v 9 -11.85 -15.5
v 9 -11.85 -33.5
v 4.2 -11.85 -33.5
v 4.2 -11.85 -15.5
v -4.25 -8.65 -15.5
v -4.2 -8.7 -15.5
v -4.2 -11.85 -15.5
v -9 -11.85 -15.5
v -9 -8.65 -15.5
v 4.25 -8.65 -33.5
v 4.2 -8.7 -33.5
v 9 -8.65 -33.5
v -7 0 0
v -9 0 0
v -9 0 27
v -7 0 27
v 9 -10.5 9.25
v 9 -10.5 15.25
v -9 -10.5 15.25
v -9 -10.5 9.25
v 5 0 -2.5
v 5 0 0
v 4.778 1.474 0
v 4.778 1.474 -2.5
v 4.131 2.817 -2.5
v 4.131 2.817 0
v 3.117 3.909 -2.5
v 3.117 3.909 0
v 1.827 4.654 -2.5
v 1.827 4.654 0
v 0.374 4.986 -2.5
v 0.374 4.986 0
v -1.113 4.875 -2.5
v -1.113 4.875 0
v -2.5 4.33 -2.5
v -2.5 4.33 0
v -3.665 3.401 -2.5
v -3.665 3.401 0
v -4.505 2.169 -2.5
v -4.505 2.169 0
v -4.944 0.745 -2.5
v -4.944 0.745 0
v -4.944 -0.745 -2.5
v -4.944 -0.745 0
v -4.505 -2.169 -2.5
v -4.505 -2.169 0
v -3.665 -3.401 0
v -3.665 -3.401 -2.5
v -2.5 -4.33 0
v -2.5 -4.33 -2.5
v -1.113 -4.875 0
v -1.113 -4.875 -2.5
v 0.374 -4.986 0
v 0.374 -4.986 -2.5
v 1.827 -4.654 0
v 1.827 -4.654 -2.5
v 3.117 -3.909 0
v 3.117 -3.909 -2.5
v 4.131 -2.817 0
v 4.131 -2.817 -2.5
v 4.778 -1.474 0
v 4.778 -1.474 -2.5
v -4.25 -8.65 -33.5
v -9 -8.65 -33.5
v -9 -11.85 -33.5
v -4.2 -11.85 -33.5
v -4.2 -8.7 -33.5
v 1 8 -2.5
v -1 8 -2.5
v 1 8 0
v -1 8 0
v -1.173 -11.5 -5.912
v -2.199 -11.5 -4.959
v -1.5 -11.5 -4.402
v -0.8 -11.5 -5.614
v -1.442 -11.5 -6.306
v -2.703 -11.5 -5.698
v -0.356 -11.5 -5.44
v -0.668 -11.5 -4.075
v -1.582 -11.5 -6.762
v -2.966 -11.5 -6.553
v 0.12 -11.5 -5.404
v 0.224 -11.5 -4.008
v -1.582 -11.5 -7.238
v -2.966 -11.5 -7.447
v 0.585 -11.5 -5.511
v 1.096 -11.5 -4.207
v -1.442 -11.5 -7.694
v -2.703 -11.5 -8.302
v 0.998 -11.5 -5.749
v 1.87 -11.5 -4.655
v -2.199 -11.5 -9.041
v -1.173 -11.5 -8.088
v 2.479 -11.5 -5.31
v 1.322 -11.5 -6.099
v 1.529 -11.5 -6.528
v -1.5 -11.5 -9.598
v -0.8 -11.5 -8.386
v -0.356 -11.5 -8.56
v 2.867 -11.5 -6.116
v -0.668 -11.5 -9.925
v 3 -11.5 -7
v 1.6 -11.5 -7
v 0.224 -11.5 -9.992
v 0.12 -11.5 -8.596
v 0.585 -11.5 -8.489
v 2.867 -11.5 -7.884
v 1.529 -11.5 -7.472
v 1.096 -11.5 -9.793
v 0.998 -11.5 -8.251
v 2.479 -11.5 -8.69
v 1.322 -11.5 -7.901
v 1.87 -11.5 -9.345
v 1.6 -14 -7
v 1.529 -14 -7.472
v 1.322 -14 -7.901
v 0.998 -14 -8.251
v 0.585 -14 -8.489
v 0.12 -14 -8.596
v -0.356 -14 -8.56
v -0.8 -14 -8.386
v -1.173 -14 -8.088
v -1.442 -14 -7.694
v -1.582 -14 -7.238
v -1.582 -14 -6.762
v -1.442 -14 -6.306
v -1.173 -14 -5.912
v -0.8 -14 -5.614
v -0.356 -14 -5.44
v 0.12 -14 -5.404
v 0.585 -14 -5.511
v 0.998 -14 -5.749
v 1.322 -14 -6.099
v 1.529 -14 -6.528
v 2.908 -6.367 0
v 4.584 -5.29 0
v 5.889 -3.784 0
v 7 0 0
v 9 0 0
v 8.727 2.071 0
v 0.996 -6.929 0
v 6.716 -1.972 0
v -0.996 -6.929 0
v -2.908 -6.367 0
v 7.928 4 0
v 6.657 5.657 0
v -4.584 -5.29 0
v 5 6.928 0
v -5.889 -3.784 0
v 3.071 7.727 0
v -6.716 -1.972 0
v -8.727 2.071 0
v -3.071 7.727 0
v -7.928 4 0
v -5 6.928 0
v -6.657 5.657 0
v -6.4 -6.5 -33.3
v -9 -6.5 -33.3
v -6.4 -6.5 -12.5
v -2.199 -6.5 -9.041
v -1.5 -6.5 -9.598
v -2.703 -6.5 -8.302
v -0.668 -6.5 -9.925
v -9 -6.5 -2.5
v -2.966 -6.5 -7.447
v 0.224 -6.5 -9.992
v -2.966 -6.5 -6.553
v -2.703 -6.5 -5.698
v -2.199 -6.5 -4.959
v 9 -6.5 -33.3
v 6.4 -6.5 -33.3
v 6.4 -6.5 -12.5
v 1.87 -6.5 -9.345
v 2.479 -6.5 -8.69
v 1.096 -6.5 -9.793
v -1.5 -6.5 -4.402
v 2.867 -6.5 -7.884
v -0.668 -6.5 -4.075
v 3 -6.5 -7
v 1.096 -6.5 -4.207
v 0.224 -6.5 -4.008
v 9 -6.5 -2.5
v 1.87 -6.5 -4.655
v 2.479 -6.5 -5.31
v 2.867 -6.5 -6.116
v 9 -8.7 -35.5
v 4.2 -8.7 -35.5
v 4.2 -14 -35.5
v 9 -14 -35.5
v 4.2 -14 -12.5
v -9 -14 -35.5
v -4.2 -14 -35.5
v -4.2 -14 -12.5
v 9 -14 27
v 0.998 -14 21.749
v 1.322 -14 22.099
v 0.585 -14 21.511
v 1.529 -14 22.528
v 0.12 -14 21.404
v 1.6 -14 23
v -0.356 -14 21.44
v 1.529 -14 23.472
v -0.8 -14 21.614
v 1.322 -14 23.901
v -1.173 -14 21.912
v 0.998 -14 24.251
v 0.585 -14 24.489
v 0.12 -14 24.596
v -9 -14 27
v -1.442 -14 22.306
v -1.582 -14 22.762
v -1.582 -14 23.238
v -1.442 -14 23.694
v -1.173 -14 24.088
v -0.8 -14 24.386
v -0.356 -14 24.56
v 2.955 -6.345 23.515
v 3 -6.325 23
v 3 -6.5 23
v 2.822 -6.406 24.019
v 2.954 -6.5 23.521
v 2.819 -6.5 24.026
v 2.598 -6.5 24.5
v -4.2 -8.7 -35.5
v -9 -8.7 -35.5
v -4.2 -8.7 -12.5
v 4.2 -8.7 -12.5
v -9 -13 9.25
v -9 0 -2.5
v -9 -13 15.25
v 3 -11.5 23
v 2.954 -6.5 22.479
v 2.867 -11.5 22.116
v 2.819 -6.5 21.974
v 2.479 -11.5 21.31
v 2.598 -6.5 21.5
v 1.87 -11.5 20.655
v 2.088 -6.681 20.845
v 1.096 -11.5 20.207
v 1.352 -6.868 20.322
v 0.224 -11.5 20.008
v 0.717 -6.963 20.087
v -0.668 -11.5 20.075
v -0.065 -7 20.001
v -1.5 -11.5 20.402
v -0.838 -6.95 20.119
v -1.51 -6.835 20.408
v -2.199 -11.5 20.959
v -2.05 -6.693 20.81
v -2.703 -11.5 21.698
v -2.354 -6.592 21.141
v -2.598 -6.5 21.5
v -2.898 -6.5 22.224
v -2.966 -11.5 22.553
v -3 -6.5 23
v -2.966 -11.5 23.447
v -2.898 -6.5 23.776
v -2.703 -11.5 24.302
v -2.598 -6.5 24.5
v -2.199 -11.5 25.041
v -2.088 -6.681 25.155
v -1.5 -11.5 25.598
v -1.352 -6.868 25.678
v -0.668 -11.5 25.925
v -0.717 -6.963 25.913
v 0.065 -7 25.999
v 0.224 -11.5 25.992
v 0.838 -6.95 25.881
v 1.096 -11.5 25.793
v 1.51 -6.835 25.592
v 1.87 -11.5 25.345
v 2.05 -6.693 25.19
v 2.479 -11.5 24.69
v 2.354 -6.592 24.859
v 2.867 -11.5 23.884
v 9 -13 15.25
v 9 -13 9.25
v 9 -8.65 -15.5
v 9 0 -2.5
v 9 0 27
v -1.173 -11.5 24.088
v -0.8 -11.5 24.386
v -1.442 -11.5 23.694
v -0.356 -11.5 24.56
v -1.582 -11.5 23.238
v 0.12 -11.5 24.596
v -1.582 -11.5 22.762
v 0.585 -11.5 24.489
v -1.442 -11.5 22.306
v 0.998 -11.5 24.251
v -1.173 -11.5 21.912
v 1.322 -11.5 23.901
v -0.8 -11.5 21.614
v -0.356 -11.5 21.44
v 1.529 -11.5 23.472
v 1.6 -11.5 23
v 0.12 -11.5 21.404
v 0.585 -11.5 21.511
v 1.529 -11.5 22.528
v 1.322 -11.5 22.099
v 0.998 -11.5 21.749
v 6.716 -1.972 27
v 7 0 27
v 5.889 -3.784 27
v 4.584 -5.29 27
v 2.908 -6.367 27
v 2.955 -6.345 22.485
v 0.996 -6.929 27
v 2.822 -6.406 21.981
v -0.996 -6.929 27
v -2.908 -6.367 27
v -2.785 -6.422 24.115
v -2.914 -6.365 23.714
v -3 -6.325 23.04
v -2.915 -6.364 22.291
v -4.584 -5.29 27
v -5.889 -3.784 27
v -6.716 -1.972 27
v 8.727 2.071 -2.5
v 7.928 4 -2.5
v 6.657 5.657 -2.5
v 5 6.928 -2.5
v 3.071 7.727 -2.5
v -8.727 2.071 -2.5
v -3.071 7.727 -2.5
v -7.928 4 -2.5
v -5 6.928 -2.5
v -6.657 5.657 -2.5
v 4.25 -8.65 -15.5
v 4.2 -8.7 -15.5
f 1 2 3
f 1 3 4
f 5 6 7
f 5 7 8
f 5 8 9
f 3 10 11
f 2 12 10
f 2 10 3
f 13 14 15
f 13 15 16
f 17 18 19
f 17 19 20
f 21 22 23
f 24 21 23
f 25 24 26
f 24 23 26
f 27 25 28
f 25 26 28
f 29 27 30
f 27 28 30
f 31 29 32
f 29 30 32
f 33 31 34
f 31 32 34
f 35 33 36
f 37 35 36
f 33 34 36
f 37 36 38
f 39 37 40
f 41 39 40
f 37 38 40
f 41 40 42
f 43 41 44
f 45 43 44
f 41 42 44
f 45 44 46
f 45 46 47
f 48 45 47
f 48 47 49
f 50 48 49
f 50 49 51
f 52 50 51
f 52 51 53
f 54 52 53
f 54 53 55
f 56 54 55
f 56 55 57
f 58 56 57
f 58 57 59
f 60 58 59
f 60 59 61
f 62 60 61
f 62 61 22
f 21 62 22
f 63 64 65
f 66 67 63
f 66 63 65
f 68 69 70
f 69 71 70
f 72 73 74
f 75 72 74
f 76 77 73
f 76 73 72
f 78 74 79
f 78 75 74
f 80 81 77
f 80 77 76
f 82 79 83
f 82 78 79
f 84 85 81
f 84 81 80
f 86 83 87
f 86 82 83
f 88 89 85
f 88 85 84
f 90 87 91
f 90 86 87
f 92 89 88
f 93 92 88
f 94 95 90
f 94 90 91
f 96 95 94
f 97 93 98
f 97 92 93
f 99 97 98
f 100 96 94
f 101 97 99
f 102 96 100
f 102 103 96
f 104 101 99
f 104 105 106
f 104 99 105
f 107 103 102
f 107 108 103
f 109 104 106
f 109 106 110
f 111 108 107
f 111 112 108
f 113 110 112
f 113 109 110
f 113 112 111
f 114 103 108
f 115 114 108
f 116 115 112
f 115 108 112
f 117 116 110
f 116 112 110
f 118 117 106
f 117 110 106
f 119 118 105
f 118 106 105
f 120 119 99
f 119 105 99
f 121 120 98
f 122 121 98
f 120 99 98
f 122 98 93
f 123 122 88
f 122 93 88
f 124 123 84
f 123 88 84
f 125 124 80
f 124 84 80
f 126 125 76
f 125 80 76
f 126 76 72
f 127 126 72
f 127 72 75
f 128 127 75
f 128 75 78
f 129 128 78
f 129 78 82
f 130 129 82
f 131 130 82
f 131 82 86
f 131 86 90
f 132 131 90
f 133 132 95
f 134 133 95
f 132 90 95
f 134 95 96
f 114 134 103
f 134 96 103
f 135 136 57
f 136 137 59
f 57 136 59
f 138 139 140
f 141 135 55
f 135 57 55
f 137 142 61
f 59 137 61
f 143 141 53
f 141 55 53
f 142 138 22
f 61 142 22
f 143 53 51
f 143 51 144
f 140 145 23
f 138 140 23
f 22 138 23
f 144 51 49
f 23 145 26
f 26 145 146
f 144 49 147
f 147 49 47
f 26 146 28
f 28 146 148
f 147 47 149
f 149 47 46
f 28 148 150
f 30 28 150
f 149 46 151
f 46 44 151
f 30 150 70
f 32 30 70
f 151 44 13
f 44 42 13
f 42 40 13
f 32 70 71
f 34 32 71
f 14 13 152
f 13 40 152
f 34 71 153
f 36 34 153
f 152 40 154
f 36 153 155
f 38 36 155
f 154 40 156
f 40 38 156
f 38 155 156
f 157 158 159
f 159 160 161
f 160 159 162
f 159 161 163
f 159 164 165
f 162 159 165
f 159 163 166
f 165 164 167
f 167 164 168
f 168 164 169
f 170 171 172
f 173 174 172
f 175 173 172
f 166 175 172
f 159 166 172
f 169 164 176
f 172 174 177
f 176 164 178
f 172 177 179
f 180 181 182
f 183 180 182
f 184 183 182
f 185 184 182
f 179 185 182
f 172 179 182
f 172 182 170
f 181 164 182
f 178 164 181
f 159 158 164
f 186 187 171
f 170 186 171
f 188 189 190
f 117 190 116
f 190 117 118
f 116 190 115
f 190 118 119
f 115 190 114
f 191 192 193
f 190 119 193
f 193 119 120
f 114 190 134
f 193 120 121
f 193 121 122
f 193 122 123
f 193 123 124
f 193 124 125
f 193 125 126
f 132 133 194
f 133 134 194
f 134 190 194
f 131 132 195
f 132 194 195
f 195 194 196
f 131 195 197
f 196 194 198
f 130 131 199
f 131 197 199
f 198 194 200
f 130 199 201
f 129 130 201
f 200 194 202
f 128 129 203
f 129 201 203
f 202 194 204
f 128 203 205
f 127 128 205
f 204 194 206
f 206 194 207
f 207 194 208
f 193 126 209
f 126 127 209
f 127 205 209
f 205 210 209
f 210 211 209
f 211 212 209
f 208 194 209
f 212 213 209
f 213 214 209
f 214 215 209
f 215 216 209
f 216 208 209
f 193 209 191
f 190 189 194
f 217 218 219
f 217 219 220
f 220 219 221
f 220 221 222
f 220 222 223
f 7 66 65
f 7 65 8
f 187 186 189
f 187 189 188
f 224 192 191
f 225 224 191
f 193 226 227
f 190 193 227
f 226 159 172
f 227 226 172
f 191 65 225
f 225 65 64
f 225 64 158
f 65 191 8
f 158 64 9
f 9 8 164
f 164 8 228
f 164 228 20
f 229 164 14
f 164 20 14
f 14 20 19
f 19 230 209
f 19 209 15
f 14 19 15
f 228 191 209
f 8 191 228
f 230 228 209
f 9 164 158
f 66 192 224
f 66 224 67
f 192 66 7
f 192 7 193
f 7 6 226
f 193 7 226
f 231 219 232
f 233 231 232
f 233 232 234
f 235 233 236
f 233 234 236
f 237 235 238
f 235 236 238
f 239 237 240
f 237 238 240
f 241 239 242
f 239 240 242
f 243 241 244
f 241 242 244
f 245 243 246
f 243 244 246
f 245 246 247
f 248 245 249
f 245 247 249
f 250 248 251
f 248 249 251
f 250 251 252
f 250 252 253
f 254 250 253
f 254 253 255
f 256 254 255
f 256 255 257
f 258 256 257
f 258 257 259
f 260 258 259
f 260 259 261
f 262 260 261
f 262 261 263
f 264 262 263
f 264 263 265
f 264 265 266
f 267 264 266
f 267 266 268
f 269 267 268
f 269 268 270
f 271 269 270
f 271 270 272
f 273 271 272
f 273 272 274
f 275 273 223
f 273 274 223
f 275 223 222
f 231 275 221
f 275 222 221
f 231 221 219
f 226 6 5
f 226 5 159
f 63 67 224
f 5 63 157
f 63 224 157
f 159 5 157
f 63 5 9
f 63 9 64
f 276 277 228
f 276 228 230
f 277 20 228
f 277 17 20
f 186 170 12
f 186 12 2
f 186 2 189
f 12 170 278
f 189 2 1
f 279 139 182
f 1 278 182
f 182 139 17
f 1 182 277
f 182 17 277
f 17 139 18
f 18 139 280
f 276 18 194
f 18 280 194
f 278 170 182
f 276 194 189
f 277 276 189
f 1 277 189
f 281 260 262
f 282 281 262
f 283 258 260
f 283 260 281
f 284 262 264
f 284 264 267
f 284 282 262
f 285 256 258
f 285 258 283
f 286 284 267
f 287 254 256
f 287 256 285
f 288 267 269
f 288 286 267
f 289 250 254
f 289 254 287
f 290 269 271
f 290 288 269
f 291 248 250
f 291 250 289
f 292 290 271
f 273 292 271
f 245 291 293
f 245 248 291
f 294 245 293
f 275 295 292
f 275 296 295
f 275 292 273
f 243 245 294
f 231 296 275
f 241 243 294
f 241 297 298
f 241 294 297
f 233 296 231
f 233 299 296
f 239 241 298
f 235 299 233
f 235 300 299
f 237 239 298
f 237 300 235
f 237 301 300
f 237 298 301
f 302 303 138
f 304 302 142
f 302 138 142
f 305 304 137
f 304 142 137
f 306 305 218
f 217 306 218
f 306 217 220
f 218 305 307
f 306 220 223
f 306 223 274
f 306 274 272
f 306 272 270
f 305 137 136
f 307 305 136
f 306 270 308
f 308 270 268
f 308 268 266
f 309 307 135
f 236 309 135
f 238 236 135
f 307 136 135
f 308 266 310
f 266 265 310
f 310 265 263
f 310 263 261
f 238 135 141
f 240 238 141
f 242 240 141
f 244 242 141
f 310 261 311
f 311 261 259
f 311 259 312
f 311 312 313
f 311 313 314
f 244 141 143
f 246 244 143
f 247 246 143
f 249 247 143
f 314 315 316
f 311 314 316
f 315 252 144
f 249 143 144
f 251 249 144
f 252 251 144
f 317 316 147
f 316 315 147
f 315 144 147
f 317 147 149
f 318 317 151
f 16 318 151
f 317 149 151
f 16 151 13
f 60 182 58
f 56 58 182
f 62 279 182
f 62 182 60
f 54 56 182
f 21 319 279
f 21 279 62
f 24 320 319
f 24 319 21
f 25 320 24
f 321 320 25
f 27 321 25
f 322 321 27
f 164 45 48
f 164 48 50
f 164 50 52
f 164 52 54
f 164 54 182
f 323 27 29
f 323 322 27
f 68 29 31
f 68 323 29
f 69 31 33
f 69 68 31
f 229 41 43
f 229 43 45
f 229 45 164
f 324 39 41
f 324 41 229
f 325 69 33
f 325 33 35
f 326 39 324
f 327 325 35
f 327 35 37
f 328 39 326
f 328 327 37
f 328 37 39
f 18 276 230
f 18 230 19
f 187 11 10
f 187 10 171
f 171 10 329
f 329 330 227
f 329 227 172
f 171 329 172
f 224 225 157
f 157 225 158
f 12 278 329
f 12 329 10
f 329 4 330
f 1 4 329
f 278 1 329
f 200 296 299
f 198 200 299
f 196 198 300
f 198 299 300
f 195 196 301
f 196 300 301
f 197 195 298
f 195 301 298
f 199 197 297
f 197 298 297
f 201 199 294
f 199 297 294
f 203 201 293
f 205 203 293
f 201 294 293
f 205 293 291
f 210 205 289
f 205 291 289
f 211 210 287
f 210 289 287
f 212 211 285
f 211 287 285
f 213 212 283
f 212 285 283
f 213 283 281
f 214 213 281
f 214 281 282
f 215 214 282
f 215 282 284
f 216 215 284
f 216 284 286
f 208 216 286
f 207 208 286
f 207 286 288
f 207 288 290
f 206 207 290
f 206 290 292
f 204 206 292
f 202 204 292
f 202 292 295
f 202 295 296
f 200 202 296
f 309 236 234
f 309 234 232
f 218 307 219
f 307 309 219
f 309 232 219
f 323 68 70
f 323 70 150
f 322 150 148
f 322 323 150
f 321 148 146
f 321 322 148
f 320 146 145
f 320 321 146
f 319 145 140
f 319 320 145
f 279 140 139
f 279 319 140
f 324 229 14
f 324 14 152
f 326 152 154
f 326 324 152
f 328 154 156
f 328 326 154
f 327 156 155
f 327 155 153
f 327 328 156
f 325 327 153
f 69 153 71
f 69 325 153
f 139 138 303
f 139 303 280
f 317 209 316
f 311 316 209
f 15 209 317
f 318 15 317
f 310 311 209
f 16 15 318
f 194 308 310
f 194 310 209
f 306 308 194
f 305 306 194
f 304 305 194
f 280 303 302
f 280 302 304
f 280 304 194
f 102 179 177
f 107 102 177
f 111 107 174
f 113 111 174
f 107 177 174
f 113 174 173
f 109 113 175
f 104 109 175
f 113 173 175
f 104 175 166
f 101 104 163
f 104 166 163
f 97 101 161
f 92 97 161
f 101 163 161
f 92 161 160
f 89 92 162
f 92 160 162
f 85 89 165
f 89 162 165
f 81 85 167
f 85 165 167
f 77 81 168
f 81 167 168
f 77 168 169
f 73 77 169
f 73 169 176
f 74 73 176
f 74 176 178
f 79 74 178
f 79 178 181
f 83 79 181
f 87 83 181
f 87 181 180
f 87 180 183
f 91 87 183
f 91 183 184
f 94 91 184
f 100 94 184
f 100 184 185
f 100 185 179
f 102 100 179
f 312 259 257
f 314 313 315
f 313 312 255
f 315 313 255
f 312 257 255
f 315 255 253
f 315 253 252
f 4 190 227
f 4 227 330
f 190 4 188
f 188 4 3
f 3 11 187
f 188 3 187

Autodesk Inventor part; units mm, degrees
ref_plane "YZ Plane" through (0, 0, 0) normal (1, 0, 0) x (0, 1, 0)
ref_plane "XZ Plane" through (0, 0, 0) normal (0, 1, 0) x (-1, 0, 0)
ref_plane "XY Plane" through (0, 0, 0) normal (0, 0, 1) x (1, 0, 0)
sketch "Sketch1" plane through (0, 0, 0) normal (0, 0, 1) x (1, 0, 0)
  circle A0 centre (0, 0) radius 7
  circle A1 centre (0, 0) radius 5
  circle A2 centre (0, 0) radius 1
  line L0 (-9, 0) -> (9, 0)
  line L1 (9, 0) -> (9, -14)
  line L2 (9, -14) -> (-9, -14)
  line L3 (-9, -14) -> (-9, 0)
  dimension "d11" = 14
  dimension "d12" = 10
  dimension "d13" = 2
  dimension "d18" = 14
  dimension "d19" = 18
extrude "Extrusion1" add sketch "Sketch1" along normal blind 27 contours L0 L1 L2 L3 A0 | A0 L0 A1 | A1 L0 A2 | A2 L0 picked at (6.2655, -0.5584) picked at (3.6182, -0.3989) picked at (-0.2952, -0.1549)
sketch "Sketch3" plane through (0, 0, 0) normal (0, 0, -1) x (-1, 0, 0)
  line L0 (9, -14) -> (9, 0) projected
  line L1 (-9, -14) -> (9, -14)
  line L2 (9, -14) -> (9, 8)
  line L3 (9, 8) -> (-9, 8)
  line L4 (-9, 8) -> (-9, -14)
  dimension "d22" = 22
extrude "Extrusion6" add sketch "Sketch3" along normal blind 2.5
extrude "Extrusion5" cut sketch "Sketch1" along normal blind 30 contours L0 A1 A0 | A0 L0 A1 | L0 A2 A1 | A1 L0 A2 | L0 A2 | A2 L0
extrude "Extrusion7" cut sketch "Sketch1" against normal through all contours L0 A2 A1 | A1 L0 A2 | L0 A2 | A2 L0
fillet "Fillet1" radius 8 2 edges at (-9, 8, -1.25) (9, 8, -1.25)
sketch "Sketch4" plane through (9, -14, 27) normal (1, 0, 0) x (0, 0, -1)
  line L0 (0, 0) -> (29.5, 0) projected
  line L1 (11.75, 3.5) -> (17.75, 3.5)
  line L2 (17.75, 3.5) -> (17.75, 1)
  line L3 (17.75, 1) -> (11.75, 1)
  line L4 (11.75, 1) -> (11.75, 3.5)
  point P0 (14.75, 0)
  point P1 (14.75, 1)
  dimension "d32" = 6
  dimension "d33" = 2.5
  dimension "d34" = 1
extrude "Extrusion8" cut sketch "Sketch4" against normal through all
sketch "Sketch5" plane through (0, 0, -2.5) normal (0, 0, -1) x (-1, 0, 0)
  line L0 (9, -14) -> (9, 0) projected
  line L1 (-9, -14) -> (9, -14)
  line L2 (9, -14) -> (9, -6.5)
  line L3 (9, -6.5) -> (-9, -6.5)
  line L4 (-9, -6.5) -> (-9, -14)
  dimension "d37" = 7.5
extrude "Extrusion9" add sketch "Sketch5" along normal blind 33
sketch "Sketch6" plane through (-9, -6.5, -2.5) normal (0, 1, 0) x (1, 0, 0)
  line L0 (4.8, 10) -> (13.2, 10)
  line L1 (13.2, 10) -> (13.2, 33)
  line L2 (13.2, 33) -> (4.8, 33)
  line L3 (4.8, 33) -> (4.8, 10)
  line L4 (0, 33) -> (18, 33) projected
  point P0 (9, -2.5)
  point P1 (9, 33)
  point P2 (9, 33)
  dimension "d45" = 23
  dimension "d47" = 0
  dimension "d69" = 8.4
extrude "Extrusion10" cut sketch "Sketch6" against normal blind 30
sketch "Sketch7" plane through (9, -14, 27) normal (1, 0, 0) x (0, 0, -1)
  line L0 (42.5, 5.35) -> (60.5, 5.35)
  line L1 (60.5, 5.35) -> (60.5, 2.15)
  line L2 (60.5, 2.15) -> (42.5, 2.15)
  line L3 (42.5, 2.15) -> (42.5, 5.35)
  line L4 (62.5, 7.5) -> (62.5, 0) projected
  line L5 (62.5, 7.5) -> (39.5, 7.5) projected
  point P0 (27, 14)
  point P1 (60.5, 3.75)
  point P2 (62.5, 3.75)
  point P3 (51.5, 5.35)
  point P4 (51, 7.5)
  point P5 (59.5, 7.5)
  dimension "d49" = 3.2
  dimension "d55" = 18
  dimension "d70" = 20
extrude "Extrusion11" cut sketch "Sketch7" against normal through all
sketch "Sketch8" plane through (-9, -6.5, -2.5) normal (0, 1, 0) x (1, 0, 0)
  circle A0 centre (9, 4.5) radius 3
  circle A1 centre (9, -25.5) radius 3
  line L0 (16, -29.5) -> (2, -29.5) projected
  point P0 (9, -2.5)
  dimension "d56" = 6
  dimension "d57" = 6
  dimension "d58" = 4
  dimension "d59" = 34
extrude "Extrusion12" cut sketch "Sketch8" along normal mid plane 10
sketch "Sketch9" plane through (0, -11.5, -7) normal (0, 1, 0) x (1, 0, 0)
  circle A0 centre (0, 0) radius 3 projected
  circle A1 centre (0, 0) radius 1.6
  circle A2 centre (0, -30) radius 1.6
  point P0 (0, -7)
  dimension "d62" = 3.2
  dimension "d63" = 3.2
extrude "Extrusion13" cut sketch "Sketch9" against normal through all contours A1 | A2
chamfer "Chamfer2" distance 2.2 angle 45 4 edges at (4.2, -6.5, -24) (-4.2, -6.5, -24) (6.6, -6.5, -35.5) (-6.6, -6.5, -35.5)
properties part number "Solinoid holder"
